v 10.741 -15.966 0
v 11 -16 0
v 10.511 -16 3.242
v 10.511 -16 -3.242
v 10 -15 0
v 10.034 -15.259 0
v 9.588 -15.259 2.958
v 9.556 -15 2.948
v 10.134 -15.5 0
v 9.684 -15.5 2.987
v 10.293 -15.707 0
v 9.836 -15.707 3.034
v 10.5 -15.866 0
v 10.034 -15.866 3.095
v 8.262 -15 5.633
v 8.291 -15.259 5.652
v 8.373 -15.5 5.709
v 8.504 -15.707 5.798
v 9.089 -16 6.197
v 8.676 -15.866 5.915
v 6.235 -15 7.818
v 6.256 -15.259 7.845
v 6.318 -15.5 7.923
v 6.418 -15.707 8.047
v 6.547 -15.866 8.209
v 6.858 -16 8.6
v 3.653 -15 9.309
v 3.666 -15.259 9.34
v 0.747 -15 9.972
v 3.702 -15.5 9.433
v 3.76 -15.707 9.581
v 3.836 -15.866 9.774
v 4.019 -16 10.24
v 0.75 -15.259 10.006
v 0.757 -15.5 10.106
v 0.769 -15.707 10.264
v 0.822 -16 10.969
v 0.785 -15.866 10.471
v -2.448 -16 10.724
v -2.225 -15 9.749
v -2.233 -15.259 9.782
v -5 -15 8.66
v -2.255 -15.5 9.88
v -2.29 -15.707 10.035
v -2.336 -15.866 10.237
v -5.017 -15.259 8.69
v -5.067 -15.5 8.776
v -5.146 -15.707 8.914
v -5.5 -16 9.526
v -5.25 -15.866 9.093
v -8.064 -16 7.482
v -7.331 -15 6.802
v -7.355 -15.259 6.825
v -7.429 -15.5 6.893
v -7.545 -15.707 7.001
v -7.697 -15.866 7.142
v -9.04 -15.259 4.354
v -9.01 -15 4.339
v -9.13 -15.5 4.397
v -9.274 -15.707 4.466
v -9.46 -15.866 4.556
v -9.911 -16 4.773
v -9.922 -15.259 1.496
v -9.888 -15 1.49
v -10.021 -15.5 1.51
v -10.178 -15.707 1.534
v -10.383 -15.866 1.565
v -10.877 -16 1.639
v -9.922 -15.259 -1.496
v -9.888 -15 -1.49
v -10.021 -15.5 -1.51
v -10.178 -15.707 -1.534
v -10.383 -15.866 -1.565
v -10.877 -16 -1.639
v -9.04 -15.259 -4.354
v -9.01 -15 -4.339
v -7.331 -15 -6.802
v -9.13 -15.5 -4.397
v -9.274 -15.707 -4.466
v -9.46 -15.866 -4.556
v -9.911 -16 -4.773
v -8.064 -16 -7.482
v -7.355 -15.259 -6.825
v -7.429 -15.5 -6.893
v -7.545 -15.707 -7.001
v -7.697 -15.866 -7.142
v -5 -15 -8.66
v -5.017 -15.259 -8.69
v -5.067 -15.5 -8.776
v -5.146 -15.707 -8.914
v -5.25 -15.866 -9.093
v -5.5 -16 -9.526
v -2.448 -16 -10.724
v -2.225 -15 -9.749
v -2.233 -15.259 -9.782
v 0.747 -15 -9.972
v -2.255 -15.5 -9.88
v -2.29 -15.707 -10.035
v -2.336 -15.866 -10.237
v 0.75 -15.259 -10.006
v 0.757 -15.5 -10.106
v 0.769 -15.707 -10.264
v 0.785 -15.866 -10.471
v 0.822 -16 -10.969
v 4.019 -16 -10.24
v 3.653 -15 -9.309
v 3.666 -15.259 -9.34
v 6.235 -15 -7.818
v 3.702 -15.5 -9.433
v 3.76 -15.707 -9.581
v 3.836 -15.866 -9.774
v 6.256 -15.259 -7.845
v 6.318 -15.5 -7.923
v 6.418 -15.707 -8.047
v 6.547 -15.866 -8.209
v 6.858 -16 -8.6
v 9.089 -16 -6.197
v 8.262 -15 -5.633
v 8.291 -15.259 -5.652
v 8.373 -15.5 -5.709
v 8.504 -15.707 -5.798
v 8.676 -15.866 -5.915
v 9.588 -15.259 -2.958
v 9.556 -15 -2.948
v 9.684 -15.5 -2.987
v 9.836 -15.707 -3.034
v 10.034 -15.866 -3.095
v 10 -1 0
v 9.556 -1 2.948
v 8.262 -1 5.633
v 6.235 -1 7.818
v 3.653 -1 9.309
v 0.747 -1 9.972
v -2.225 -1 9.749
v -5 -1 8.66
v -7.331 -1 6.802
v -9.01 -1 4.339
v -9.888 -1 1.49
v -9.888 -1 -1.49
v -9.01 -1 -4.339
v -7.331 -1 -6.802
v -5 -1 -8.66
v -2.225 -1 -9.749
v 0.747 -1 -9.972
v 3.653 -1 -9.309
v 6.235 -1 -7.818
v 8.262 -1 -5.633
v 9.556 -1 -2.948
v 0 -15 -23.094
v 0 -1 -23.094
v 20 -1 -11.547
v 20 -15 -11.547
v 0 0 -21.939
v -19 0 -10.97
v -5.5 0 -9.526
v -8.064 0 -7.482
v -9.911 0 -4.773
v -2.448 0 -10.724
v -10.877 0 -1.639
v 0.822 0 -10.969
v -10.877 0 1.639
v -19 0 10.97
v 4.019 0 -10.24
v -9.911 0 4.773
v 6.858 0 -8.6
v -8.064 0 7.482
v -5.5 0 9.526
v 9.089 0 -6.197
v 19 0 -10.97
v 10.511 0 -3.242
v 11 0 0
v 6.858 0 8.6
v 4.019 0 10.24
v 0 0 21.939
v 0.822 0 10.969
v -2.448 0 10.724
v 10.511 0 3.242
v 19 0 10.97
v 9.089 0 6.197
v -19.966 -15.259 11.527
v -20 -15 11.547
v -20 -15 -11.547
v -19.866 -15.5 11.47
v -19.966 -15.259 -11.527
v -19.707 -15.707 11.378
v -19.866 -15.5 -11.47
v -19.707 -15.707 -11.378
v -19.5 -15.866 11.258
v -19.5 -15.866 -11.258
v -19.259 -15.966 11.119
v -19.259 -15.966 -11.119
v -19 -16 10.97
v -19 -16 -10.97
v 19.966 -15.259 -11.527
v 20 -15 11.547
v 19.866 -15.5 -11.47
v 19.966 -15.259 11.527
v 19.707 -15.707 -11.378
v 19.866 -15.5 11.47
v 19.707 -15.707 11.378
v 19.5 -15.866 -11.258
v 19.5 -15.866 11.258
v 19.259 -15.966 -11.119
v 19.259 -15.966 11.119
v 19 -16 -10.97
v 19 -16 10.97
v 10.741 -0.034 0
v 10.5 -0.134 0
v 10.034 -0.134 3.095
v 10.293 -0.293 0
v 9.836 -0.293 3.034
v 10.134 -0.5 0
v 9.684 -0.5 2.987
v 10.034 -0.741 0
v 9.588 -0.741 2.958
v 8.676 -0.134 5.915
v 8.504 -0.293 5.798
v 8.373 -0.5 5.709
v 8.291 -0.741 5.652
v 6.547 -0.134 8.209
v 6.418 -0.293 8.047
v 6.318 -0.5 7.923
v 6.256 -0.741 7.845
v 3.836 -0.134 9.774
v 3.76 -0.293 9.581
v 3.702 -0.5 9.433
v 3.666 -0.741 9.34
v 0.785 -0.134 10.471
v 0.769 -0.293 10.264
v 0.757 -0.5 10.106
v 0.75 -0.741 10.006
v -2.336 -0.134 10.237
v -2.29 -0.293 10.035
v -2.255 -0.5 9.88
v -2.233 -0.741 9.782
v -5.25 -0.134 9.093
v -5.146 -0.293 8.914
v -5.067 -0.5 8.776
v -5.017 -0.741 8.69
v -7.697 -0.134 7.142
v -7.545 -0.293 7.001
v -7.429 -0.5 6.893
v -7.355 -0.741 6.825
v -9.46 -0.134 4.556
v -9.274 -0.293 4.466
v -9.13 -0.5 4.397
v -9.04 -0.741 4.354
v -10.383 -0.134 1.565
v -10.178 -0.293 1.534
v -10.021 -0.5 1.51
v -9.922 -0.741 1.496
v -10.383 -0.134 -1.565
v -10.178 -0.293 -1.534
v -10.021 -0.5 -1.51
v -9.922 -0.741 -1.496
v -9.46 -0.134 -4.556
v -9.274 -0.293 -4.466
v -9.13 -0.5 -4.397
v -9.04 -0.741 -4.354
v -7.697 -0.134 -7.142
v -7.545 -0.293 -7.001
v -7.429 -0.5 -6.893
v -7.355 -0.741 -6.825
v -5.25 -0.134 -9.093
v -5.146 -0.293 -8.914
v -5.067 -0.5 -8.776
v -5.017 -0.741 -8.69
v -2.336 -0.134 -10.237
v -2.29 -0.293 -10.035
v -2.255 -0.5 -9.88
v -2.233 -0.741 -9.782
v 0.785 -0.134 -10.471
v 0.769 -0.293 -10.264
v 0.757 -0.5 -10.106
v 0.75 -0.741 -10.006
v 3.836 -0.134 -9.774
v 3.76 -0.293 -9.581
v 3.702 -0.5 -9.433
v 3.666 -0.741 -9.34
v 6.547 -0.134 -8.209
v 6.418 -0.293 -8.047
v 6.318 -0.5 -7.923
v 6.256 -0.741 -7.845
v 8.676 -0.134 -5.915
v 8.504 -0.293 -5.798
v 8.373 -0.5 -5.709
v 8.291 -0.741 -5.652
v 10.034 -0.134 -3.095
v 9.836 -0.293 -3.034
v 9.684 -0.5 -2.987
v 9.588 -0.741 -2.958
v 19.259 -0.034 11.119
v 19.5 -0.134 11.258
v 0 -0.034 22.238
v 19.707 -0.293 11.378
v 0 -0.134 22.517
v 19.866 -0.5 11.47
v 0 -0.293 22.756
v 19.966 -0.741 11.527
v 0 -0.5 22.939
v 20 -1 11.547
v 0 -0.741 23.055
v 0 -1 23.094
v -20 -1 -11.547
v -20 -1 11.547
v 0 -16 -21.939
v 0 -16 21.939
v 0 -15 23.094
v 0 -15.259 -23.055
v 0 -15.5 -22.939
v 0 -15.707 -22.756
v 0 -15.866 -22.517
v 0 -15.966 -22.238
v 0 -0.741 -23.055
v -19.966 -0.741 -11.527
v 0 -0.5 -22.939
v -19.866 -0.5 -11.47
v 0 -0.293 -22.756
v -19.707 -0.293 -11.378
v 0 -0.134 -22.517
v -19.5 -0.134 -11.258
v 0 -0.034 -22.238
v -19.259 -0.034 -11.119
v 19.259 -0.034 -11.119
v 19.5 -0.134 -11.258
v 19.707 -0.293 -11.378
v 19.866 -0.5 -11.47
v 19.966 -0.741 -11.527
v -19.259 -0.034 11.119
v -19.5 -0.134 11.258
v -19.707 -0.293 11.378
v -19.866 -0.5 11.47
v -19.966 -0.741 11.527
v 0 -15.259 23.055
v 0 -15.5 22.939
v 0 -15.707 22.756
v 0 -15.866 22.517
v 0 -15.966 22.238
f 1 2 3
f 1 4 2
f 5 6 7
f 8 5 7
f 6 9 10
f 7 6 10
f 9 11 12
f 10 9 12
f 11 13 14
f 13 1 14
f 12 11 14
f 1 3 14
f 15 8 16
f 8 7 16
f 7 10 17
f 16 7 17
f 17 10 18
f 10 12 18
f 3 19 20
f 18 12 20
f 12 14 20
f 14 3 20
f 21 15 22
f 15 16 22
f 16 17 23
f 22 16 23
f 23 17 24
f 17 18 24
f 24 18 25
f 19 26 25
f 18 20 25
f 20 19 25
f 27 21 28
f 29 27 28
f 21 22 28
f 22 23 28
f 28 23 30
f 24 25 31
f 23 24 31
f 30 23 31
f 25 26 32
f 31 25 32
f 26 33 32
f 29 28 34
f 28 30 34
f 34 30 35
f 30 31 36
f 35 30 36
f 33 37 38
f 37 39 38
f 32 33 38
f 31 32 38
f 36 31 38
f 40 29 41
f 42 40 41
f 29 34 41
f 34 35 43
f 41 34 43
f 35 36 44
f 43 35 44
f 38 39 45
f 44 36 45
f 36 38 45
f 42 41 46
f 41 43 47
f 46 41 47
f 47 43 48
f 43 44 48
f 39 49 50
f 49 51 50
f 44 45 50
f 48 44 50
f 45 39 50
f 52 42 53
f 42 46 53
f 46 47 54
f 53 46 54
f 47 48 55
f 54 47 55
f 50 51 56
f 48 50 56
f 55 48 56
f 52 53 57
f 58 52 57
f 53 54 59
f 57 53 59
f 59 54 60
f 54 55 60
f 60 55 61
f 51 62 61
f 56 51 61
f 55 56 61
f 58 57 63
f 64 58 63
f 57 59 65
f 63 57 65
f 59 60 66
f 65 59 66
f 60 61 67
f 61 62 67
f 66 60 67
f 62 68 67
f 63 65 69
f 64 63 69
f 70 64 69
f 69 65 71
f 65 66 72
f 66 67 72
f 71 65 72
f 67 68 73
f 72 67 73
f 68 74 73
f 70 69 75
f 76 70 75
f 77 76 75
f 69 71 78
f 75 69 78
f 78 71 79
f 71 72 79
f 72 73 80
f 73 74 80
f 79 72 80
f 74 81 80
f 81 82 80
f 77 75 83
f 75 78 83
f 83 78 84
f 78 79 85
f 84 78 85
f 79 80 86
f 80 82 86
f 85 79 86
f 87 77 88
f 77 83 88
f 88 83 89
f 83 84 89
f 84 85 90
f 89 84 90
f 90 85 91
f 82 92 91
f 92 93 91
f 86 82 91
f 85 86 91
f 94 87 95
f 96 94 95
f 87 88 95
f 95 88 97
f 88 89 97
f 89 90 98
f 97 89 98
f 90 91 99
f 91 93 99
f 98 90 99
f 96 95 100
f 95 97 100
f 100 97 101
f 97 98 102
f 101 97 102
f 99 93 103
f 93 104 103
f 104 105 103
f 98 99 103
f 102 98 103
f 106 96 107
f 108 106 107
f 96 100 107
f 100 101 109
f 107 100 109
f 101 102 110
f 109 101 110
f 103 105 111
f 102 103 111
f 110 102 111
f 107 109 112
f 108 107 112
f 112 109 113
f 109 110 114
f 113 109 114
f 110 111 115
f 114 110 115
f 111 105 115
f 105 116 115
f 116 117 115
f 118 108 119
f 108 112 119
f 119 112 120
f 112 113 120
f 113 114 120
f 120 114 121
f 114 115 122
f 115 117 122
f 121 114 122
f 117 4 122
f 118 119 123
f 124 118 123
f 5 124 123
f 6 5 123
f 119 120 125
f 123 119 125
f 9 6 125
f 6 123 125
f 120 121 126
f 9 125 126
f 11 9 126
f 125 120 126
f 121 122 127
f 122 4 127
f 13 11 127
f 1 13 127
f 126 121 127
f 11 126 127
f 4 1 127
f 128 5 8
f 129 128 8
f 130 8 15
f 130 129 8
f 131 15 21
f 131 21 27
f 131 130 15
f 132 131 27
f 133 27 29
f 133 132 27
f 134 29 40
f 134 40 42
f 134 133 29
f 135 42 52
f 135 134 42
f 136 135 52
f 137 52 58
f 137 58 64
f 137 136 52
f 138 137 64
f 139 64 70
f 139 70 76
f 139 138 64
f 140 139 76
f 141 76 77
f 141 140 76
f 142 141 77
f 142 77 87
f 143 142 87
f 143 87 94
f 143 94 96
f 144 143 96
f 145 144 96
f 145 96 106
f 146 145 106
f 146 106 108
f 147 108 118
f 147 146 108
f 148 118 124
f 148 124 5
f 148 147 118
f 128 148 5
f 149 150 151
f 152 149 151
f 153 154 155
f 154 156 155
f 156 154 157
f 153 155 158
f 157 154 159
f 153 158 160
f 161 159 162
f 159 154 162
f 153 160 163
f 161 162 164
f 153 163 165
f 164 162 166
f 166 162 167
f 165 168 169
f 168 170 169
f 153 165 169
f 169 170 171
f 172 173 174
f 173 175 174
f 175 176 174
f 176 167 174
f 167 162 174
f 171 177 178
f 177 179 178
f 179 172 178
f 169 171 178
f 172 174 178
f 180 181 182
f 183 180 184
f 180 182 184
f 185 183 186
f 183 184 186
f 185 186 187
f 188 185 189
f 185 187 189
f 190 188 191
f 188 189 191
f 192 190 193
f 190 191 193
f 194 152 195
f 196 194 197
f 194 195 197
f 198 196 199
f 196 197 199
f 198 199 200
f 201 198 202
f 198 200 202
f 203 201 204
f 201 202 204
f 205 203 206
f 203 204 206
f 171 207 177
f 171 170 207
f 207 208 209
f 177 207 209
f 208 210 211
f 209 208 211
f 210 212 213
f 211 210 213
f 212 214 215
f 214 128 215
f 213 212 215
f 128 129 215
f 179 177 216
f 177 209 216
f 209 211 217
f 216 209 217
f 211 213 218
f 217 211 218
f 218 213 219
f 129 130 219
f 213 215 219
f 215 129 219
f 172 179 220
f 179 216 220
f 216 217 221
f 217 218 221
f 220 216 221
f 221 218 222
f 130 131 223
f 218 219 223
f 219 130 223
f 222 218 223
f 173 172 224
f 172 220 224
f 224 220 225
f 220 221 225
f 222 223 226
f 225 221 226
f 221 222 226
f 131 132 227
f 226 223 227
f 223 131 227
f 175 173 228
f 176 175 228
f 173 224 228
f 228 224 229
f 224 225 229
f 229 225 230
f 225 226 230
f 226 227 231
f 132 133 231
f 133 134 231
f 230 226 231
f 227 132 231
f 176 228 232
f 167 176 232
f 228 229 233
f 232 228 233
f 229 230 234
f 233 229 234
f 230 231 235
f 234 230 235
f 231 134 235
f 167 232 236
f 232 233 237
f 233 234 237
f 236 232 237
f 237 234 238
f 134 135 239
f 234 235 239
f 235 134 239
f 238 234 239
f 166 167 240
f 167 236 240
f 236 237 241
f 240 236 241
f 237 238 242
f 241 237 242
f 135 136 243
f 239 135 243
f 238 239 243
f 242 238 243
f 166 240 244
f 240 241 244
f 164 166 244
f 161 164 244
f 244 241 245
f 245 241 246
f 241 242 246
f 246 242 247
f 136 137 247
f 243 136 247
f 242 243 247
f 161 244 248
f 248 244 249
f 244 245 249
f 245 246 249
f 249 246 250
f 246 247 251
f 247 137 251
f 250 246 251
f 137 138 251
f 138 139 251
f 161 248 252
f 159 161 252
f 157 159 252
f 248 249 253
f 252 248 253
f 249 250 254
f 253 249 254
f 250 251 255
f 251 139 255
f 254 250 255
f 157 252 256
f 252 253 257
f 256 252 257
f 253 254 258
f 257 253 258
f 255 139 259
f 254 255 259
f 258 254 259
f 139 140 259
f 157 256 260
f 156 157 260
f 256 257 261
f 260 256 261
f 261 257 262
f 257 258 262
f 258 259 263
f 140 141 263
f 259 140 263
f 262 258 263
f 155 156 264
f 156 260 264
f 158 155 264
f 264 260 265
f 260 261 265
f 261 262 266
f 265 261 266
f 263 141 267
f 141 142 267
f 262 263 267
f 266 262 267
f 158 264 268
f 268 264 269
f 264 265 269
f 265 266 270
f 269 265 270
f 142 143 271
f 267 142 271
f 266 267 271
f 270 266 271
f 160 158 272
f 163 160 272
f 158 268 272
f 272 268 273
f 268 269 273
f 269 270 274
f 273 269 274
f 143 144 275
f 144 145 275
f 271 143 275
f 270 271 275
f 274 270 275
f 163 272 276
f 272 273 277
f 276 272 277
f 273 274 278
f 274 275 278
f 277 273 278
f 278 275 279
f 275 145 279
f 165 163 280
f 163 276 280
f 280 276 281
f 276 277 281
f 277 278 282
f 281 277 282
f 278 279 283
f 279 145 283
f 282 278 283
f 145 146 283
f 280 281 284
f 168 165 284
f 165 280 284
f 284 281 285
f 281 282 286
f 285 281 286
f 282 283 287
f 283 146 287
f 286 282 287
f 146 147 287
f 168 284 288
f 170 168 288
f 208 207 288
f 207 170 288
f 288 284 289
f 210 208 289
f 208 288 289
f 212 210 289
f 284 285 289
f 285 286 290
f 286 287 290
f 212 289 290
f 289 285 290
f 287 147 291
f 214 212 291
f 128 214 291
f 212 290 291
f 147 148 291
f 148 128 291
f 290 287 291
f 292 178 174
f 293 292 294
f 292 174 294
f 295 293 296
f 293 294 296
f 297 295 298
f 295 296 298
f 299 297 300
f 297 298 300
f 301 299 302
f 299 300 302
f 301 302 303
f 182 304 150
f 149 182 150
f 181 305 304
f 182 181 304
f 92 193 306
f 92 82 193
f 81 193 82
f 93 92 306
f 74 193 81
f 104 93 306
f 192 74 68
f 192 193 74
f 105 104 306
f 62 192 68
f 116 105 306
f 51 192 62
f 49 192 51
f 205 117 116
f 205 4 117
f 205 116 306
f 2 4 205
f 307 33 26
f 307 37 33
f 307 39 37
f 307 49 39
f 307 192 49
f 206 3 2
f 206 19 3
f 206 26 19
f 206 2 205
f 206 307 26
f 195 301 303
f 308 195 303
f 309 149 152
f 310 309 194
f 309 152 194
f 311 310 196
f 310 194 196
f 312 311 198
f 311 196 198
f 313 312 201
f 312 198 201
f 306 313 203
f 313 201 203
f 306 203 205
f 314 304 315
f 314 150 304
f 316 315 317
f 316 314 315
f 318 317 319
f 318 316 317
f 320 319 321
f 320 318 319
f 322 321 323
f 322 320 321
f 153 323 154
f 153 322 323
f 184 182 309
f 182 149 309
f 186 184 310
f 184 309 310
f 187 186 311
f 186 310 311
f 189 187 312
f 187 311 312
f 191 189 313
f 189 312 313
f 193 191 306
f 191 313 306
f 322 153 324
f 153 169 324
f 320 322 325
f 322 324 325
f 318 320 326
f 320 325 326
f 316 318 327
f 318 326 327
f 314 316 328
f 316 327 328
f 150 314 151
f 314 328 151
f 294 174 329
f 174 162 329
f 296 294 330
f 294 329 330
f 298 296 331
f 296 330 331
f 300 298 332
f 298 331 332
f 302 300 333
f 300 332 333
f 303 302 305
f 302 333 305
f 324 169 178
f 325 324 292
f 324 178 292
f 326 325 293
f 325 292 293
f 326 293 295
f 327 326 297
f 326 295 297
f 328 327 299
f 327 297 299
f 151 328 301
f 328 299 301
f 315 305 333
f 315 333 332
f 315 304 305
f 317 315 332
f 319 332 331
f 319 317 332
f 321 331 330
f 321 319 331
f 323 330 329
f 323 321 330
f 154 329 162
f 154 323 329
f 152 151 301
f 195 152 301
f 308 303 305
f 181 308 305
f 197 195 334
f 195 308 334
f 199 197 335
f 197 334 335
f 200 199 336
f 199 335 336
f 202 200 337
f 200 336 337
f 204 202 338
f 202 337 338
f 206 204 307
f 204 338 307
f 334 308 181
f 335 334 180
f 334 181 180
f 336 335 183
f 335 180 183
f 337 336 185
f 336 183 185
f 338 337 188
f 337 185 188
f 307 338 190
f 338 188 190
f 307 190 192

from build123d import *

# Parameters (mm, degrees)
F0_R     = 10
F1_DEPTH = 16
F2_R     = 1
F3_R     = 1


with BuildPart() as f1:
    # F0 (on Front) → F1 (new body)
    with BuildSketch(Plane.XZ):
        Polygon((-20, -11.547005), (0, -23.094011), (20, -11.547005), (20, 11.547005), (0, 23.094011), (-20, 11.547005), align=None)
        Circle(F0_R, mode=Mode.SUBTRACT)
    extrude(amount=F1_DEPTH)

    # F2
    f2_edges = [f1.edges().sort_by_distance(p)[0] for p in [
        (-20, -16, 0),
        (-10, -16, -17.320508),
        (10, -16, -17.320508),
        (20, -16, 0),
        (10, -16, 17.320508),
        (-10, -16, 17.320508),
        (-10, -16, 0),
    ]]
    fillet(f2_edges, radius=F2_R)

    # F3
    f3_edges = [f1.edges().sort_by_distance(p)[0] for p in [
        (-20, 0, 0),
        (-10, 0, -17.320508),
        (10, 0, -17.320508),
        (20, 0, 0),
        (10, 0, 17.320508),
        (-10, 0, 17.320508),
        (-10, 0, 0),
    ]]
    fillet(f3_edges, radius=F3_R)


solid = f1.part
